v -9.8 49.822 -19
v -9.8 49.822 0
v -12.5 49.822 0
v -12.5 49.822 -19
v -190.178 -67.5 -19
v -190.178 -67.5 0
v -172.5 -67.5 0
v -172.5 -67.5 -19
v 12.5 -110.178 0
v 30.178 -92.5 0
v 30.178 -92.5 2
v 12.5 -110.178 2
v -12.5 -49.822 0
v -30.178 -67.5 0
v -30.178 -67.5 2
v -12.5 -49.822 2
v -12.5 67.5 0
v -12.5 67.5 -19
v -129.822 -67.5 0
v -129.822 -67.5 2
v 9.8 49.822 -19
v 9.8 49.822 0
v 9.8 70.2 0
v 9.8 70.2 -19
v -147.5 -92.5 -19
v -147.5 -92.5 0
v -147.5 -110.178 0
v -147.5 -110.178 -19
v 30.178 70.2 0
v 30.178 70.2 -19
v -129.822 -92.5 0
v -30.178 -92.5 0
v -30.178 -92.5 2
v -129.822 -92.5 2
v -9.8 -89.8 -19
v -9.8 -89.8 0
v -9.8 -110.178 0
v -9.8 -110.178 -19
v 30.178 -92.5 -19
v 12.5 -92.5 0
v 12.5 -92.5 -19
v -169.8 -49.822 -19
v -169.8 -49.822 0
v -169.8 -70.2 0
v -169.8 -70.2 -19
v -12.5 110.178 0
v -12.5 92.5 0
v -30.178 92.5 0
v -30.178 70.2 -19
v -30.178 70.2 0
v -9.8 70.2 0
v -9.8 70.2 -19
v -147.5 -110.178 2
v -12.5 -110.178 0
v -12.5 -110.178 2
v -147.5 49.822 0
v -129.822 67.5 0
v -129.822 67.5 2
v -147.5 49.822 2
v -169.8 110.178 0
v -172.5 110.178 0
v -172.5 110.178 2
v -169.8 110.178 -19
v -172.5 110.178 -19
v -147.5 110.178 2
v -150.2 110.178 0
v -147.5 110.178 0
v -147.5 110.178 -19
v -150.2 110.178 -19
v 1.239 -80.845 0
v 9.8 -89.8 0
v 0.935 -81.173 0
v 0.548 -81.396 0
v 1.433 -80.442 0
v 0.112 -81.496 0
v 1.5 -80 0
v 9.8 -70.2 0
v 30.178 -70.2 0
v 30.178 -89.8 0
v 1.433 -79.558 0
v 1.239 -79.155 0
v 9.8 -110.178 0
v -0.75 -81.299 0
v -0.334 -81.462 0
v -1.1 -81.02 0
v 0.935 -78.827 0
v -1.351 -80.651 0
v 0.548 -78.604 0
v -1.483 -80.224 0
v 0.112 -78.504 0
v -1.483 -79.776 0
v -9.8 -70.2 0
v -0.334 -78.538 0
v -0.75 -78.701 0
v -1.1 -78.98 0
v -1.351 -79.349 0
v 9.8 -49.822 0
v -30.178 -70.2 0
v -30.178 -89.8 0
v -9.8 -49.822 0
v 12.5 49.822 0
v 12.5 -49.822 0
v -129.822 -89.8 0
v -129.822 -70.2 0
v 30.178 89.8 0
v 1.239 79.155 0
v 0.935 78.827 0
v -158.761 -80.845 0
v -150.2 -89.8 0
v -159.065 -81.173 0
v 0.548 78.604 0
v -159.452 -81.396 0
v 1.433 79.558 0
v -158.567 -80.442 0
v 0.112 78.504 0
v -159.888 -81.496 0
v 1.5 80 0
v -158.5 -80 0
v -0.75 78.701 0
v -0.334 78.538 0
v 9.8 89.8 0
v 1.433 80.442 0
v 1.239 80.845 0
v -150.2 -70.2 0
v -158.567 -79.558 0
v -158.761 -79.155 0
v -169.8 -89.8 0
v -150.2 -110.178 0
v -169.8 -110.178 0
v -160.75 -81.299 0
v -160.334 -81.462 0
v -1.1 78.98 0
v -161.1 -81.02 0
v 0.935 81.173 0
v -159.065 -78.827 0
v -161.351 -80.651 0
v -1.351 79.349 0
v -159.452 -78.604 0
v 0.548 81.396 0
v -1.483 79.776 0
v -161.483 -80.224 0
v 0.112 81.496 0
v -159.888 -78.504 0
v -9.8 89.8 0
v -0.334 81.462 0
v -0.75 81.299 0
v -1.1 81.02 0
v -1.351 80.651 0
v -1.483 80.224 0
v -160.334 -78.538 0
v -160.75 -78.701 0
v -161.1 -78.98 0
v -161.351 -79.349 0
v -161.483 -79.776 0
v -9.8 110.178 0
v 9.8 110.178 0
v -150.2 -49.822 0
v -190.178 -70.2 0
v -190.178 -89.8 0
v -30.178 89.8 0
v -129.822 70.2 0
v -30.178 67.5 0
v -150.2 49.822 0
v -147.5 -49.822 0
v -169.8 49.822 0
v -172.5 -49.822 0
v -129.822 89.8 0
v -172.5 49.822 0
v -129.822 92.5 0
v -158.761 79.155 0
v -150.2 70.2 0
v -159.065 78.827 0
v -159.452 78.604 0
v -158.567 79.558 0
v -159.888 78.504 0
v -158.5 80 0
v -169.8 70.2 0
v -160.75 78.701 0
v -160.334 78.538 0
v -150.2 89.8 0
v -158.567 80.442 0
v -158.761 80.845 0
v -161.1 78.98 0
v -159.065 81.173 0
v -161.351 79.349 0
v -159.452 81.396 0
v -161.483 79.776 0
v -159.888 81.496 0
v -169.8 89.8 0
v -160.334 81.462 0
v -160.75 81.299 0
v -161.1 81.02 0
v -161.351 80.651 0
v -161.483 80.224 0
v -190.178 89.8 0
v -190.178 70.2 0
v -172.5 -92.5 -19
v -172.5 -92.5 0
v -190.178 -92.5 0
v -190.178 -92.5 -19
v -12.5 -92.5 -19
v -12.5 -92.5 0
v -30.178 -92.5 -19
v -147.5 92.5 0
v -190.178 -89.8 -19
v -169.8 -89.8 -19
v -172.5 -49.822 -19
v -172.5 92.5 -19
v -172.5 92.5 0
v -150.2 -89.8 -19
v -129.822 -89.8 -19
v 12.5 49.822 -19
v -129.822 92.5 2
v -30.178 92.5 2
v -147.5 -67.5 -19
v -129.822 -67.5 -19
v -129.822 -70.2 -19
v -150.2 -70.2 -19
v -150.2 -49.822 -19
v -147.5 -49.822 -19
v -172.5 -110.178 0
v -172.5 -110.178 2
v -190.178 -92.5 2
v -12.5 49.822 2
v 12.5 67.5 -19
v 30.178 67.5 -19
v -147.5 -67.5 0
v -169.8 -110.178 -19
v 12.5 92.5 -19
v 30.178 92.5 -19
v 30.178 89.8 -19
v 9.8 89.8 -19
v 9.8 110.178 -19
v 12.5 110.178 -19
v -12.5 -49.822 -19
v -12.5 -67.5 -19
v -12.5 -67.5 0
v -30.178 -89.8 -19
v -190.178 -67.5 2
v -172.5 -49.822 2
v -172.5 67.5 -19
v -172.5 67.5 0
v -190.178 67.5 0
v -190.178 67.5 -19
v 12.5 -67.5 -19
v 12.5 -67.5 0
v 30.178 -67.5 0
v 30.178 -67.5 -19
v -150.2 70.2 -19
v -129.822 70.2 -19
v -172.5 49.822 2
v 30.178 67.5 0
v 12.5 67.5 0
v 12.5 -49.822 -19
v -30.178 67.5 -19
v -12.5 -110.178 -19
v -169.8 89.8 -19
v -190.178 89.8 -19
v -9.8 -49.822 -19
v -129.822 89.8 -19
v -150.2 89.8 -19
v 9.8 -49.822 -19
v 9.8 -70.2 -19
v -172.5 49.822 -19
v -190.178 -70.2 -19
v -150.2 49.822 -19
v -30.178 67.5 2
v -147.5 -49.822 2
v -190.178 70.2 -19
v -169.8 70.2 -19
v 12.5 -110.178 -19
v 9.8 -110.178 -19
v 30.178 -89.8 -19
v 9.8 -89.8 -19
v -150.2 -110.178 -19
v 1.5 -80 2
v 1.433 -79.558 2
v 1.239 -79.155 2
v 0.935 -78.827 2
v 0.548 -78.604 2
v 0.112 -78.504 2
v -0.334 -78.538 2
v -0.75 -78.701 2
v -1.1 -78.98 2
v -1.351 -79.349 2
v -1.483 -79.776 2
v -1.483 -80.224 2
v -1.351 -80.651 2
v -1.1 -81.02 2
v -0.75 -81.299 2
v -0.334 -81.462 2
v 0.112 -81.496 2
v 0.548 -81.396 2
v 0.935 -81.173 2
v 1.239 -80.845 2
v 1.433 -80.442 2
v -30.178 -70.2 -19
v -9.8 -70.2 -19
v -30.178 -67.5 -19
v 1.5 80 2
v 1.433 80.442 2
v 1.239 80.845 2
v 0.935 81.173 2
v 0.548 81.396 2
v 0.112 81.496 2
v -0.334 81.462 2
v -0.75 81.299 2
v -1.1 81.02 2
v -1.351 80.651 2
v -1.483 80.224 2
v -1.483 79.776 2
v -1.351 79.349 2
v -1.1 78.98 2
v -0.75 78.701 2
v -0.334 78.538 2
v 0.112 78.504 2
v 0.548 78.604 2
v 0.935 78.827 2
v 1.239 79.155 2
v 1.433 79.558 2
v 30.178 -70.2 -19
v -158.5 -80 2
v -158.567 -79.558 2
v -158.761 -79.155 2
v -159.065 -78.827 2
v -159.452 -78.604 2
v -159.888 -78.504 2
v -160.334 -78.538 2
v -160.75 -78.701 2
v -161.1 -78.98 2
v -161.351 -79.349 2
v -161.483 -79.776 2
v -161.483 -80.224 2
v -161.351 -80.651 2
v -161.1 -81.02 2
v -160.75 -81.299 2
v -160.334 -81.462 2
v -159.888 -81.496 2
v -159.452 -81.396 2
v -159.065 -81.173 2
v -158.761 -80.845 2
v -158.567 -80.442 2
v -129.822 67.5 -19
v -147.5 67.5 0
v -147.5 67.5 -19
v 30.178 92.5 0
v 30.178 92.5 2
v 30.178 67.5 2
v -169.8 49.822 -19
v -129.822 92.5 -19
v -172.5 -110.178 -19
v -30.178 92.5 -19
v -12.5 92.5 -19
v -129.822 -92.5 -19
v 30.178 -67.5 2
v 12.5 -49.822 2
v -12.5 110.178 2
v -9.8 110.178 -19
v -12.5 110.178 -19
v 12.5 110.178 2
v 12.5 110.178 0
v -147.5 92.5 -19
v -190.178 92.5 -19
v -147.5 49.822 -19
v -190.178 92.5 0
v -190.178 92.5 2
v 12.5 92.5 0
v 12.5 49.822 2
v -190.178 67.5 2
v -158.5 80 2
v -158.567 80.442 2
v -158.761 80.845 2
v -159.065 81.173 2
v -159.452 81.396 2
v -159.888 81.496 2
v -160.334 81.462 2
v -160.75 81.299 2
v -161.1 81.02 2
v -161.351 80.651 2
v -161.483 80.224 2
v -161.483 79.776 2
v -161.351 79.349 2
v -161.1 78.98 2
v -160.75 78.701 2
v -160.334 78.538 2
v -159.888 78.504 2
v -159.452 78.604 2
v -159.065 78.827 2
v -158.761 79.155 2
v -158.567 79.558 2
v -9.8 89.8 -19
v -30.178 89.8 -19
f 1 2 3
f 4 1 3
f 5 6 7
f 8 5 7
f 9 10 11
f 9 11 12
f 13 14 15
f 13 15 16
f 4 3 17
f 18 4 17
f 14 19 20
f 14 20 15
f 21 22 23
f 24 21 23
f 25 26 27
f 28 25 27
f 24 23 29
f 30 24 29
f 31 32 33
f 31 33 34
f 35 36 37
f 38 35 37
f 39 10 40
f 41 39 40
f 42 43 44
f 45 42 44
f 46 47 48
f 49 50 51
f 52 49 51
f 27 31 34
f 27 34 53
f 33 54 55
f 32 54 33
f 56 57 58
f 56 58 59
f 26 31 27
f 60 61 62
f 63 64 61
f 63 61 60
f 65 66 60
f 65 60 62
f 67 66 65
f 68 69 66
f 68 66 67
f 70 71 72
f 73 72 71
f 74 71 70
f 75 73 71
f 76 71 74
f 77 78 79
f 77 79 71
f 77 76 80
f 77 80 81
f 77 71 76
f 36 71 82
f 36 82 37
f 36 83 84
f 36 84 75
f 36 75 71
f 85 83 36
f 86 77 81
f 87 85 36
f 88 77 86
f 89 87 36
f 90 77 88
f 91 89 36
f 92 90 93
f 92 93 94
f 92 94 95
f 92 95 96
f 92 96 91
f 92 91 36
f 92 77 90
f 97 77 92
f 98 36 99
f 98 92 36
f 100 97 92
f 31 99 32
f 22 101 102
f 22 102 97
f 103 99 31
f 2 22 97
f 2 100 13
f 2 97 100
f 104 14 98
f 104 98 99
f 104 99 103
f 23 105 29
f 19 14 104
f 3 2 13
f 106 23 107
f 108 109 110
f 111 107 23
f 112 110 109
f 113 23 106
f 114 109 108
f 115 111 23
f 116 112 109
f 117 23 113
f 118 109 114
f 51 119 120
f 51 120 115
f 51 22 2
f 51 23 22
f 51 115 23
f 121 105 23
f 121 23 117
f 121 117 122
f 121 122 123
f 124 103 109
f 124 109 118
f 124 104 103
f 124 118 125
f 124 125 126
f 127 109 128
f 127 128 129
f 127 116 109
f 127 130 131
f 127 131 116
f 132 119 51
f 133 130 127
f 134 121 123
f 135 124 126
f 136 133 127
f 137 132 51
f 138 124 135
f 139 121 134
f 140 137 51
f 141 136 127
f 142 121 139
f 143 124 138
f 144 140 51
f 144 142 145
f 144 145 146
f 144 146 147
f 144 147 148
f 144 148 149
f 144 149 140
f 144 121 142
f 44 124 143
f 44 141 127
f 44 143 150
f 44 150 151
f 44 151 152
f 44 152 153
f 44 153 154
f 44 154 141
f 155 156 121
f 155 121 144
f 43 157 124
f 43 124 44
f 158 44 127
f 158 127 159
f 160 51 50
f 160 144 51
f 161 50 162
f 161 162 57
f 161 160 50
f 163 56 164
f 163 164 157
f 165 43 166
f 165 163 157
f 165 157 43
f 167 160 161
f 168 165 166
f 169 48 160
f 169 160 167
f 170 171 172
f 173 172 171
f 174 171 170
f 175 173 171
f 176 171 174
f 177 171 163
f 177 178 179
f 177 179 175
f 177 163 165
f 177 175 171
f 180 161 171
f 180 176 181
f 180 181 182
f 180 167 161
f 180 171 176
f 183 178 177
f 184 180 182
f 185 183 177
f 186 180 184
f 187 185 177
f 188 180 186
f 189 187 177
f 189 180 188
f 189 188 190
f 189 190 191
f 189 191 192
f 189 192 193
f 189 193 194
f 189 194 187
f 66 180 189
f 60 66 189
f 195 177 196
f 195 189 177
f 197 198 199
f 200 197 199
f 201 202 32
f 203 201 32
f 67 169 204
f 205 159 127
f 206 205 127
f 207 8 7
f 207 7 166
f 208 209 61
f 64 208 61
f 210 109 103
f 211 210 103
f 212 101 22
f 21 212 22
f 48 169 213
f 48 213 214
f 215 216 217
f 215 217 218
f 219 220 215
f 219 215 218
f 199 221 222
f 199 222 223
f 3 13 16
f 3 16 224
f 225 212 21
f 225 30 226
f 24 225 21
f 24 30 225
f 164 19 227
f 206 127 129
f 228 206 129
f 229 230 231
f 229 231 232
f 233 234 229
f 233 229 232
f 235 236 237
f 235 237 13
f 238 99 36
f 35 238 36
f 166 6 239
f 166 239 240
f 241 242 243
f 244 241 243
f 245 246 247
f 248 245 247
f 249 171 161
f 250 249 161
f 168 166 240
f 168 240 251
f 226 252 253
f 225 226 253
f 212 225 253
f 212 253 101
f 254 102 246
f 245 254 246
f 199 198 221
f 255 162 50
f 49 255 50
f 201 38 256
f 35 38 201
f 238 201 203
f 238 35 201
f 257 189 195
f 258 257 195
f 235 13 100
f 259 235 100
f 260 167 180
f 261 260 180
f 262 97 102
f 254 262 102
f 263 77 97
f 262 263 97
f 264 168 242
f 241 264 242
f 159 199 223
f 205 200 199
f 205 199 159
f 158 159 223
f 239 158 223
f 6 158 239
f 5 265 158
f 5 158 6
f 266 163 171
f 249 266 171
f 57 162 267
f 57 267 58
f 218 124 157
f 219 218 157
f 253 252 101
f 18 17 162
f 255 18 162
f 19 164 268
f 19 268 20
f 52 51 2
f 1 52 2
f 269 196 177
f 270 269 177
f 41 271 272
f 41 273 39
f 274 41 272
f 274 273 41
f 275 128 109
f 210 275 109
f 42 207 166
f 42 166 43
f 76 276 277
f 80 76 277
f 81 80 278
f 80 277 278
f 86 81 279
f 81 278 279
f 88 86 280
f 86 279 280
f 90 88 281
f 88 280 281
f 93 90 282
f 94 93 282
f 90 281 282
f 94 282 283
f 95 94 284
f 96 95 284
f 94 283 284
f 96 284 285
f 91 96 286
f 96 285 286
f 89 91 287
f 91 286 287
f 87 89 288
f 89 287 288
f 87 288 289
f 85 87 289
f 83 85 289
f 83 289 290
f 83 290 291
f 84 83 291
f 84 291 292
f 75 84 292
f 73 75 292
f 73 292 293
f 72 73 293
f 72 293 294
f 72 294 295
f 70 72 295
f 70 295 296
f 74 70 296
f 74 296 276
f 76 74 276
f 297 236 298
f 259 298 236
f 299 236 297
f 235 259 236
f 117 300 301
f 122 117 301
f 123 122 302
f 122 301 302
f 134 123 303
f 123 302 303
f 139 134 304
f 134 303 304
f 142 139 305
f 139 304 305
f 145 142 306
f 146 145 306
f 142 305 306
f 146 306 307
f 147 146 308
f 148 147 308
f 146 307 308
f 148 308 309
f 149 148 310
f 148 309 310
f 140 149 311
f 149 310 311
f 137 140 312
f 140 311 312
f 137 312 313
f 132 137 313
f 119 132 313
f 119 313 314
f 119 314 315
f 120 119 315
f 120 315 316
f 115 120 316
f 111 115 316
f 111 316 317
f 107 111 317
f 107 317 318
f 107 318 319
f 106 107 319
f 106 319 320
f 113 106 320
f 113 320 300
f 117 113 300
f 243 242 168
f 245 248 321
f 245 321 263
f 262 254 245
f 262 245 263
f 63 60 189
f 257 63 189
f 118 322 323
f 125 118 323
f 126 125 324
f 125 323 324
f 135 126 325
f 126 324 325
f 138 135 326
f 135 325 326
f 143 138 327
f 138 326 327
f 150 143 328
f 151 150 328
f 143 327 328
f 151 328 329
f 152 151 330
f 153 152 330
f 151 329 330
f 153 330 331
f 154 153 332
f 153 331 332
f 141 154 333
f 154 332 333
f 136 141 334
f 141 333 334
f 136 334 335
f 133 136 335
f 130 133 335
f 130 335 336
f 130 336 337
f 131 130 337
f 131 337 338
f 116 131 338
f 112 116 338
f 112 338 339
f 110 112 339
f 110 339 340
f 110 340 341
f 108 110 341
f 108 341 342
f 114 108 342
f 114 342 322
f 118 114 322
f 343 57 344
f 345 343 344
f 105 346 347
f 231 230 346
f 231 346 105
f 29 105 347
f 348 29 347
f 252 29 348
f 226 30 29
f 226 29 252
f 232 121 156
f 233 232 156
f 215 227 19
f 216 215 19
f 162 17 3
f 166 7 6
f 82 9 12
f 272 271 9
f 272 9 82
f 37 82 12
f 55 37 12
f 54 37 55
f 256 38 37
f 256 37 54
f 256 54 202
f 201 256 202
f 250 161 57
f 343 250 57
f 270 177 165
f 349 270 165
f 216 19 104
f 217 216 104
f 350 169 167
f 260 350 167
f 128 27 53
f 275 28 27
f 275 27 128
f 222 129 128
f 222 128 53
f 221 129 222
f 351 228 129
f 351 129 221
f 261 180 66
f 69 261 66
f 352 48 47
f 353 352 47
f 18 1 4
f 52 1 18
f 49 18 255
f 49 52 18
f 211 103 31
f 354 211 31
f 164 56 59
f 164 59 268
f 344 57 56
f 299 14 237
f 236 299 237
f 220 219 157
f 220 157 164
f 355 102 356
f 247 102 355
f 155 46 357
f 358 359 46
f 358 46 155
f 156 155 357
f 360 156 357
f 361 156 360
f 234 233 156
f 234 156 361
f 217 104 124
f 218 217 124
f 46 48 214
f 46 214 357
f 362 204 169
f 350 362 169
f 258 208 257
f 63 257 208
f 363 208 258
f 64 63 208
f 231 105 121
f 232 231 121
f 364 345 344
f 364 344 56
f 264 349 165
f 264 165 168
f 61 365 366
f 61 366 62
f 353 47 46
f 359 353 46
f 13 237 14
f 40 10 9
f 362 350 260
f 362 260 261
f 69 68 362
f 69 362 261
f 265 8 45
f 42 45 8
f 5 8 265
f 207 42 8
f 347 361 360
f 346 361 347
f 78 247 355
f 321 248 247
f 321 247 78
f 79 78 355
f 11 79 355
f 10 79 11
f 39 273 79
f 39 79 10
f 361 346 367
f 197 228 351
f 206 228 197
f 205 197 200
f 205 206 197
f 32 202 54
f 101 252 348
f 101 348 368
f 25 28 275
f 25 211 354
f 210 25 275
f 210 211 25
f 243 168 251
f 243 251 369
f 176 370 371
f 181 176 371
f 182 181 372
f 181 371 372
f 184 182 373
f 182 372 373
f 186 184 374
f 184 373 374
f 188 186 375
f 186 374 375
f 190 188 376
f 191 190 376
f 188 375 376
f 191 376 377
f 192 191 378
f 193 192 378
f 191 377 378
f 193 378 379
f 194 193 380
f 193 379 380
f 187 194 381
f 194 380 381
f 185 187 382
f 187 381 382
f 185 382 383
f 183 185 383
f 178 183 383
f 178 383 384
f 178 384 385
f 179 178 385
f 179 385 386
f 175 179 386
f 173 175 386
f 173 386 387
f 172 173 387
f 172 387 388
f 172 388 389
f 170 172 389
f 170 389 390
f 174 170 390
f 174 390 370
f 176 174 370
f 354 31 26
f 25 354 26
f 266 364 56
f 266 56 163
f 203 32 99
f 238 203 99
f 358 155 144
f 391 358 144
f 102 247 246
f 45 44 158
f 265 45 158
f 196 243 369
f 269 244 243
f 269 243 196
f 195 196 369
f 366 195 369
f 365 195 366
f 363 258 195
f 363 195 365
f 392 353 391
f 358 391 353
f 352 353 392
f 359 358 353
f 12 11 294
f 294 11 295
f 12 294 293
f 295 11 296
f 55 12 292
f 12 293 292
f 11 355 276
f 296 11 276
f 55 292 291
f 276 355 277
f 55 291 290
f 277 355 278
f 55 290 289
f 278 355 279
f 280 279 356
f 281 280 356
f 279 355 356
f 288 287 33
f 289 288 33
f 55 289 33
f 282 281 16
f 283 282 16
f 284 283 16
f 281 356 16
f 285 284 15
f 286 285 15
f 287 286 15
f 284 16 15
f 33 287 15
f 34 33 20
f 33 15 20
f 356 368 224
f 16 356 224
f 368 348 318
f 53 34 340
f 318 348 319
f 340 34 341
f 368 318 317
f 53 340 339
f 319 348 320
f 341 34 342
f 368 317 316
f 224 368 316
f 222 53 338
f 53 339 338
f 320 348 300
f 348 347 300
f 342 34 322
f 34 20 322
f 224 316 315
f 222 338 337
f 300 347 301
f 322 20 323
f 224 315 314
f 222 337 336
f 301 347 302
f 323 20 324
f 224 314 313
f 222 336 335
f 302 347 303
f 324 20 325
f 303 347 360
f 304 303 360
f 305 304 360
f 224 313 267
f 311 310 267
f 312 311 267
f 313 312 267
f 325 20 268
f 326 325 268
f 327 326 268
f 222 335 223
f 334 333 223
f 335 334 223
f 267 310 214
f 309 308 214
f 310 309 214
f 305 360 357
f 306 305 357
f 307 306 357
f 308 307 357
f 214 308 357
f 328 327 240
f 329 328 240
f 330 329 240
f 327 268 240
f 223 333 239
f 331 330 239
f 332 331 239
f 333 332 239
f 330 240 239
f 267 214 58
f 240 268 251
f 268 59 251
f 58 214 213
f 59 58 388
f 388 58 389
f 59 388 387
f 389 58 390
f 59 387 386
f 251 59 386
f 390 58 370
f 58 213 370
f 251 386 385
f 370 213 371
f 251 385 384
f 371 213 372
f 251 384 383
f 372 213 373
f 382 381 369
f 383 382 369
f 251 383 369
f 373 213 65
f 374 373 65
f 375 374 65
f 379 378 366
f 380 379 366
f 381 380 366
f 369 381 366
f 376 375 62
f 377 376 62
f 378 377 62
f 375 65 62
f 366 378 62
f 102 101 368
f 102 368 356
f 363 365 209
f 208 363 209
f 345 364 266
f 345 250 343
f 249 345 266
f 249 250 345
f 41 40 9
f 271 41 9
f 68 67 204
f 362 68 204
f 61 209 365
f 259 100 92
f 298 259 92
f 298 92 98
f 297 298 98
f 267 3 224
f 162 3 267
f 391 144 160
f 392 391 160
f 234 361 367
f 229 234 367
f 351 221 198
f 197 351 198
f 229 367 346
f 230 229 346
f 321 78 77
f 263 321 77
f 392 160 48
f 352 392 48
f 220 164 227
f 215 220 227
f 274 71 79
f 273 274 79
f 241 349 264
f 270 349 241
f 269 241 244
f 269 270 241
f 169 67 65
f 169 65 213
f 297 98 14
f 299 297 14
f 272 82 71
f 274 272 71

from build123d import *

# Parameters (mm, degrees)
BOSS_EXTRUDE1_DEPTH = 2
BOSS_EXTRUDE2_DEPTH = 19
SKETCH6_R           = 1.5
CUT_EXTRUDE1_DEPTH  = 221.788733523


with BuildPart() as part:
    # Sketch1 → Boss-Extrude1 (new body)
    with BuildSketch(Plane.XY):
        Polygon((12.5, -110.17766953), (-12.5, -110.17766953), (-30.17766953, -92.5), (-129.82233047, -92.5), (-147.5, -110.17766953), (-172.5, -110.17766953), (-190.17766953, -92.5), (-190.17766953, -67.5), (-172.5, -49.82233047), (-172.5, 49.82233047), (-190.17766953, 67.5), (-190.17766953, 92.5), (-172.5, 110.17766953), (-147.5, 110.17766953), (-129.82233047, 92.5), (-30.17766953, 92.5), (-12.5, 110.17766953), (12.5, 110.17766953), (30.17766953, 92.5), (30.17766953, 67.5), (12.5, 49.82233047), (12.5, -49.82233047), (30.17766953, -67.5), (30.17766953, -92.5), align=None)
        Polygon((-30.17766953, -67.5), (-12.5, -49.82233047), (-12.5, 49.82233047), (-30.17766953, 67.5), (-129.82233047, 67.5), (-147.5, 49.82233047), (-147.5, -49.82233047), (-129.82233047, -67.5), align=None, mode=Mode.SUBTRACT)
    extrude(amount=BOSS_EXTRUDE1_DEPTH)

    # Sketch2 → Boss-Extrude2 (add)
    with BuildSketch(Plane(origin=(0, 0, 0), x_dir=(-1, 0, 0), z_dir=(0, 0, -1))):
        Polygon((30.17766953, -67.5), (12.5, -67.5), (12.5, -49.82233047), (9.8, -49.82233047), (9.8, -70.2), (30.17766953, -70.2), align=None)
        Polygon((12.5, -92.5), (30.17766953, -92.5), (30.17766953, -89.8), (9.8, -89.8), (9.8, -110.17766953), (12.5, -110.17766953), align=None)
        Polygon((-12.5, -92.5), (-12.5, -110.17766953), (-9.8, -110.17766953), (-9.8, -89.8), (-30.17766953, -89.8), (-30.17766953, -92.5), align=None)
        Polygon((-12.5, -67.5), (-30.17766953, -67.5), (-30.17766953, -70.2), (-9.8, -70.2), (-9.8, -49.82233047), (-12.5, -49.82233047), align=None)
        Polygon((190.17766953, -67.5), (172.5, -67.5), (172.5, -49.82233047), (169.8, -49.82233047), (169.8, -70.2), (190.17766953, -70.2), align=None)
        Polygon((172.5, -92.5), (190.17766953, -92.5), (190.17766953, -89.8), (169.8, -89.8), (169.8, -110.17766953), (172.5, -110.17766953), align=None)
        Polygon((147.5, -92.5), (147.5, -110.17766953), (150.2, -110.17766953), (150.2, -89.8), (129.82233047, -89.8), (129.82233047, -92.5), align=None)
        Polygon((147.5, -67.5), (129.82233047, -67.5), (129.82233047, -70.2), (150.2, -70.2), (150.2, -49.82233047), (147.5, -49.82233047), align=None)
        Polygon((190.17766953, 92.5), (172.5, 92.5), (172.5, 110.17766953), (169.8, 110.17766953), (169.8, 89.8), (190.17766953, 89.8), align=None)
        Polygon((172.5, 67.5), (190.17766953, 67.5), (190.17766953, 70.2), (169.8, 70.2), (169.8, 49.82233047), (172.5, 49.82233047), align=None)
        Polygon((147.5, 67.5), (147.5, 49.82233047), (150.2, 49.82233047), (150.2, 70.2), (129.82233047, 70.2), (129.82233047, 67.5), align=None)
        Polygon((147.5, 92.5), (129.82233047, 92.5), (129.82233047, 89.8), (150.2, 89.8), (150.2, 110.17766953), (147.5, 110.17766953), align=None)
        Polygon((30.17766953, 92.5), (12.5, 92.5), (12.5, 110.17766953), (9.8, 110.17766953), (9.8, 89.8), (30.17766953, 89.8), align=None)
        Polygon((12.5, 67.5), (30.17766953, 67.5), (30.17766953, 70.2), (9.8, 70.2), (9.8, 49.82233047), (12.5, 49.82233047), align=None)
        Polygon((-12.5, 67.5), (-12.5, 49.82233047), (-9.8, 49.82233047), (-9.8, 70.2), (-30.17766953, 70.2), (-30.17766953, 67.5), align=None)
        Polygon((-12.5, 92.5), (-30.17766953, 92.5), (-30.17766953, 89.8), (-9.8, 89.8), (-9.8, 110.17766953), (-12.5, 110.17766953), align=None)
    extrude(amount=BOSS_EXTRUDE2_DEPTH)

    # Sketch6 → Cut-Extrude1 (cut, through all)
    with BuildSketch(Plane.XY.offset(2)):
        with Locations((-160, 80)):
            Circle(SKETCH6_R)
        with Locations((0, 80)):
            Circle(SKETCH6_R)
        with Locations((-160, -80)):
            Circle(SKETCH6_R)
        with Locations((0, -80)):
            Circle(SKETCH6_R)
    extrude(amount=-CUT_EXTRUDE1_DEPTH, mode=Mode.SUBTRACT)


solid = part.part
